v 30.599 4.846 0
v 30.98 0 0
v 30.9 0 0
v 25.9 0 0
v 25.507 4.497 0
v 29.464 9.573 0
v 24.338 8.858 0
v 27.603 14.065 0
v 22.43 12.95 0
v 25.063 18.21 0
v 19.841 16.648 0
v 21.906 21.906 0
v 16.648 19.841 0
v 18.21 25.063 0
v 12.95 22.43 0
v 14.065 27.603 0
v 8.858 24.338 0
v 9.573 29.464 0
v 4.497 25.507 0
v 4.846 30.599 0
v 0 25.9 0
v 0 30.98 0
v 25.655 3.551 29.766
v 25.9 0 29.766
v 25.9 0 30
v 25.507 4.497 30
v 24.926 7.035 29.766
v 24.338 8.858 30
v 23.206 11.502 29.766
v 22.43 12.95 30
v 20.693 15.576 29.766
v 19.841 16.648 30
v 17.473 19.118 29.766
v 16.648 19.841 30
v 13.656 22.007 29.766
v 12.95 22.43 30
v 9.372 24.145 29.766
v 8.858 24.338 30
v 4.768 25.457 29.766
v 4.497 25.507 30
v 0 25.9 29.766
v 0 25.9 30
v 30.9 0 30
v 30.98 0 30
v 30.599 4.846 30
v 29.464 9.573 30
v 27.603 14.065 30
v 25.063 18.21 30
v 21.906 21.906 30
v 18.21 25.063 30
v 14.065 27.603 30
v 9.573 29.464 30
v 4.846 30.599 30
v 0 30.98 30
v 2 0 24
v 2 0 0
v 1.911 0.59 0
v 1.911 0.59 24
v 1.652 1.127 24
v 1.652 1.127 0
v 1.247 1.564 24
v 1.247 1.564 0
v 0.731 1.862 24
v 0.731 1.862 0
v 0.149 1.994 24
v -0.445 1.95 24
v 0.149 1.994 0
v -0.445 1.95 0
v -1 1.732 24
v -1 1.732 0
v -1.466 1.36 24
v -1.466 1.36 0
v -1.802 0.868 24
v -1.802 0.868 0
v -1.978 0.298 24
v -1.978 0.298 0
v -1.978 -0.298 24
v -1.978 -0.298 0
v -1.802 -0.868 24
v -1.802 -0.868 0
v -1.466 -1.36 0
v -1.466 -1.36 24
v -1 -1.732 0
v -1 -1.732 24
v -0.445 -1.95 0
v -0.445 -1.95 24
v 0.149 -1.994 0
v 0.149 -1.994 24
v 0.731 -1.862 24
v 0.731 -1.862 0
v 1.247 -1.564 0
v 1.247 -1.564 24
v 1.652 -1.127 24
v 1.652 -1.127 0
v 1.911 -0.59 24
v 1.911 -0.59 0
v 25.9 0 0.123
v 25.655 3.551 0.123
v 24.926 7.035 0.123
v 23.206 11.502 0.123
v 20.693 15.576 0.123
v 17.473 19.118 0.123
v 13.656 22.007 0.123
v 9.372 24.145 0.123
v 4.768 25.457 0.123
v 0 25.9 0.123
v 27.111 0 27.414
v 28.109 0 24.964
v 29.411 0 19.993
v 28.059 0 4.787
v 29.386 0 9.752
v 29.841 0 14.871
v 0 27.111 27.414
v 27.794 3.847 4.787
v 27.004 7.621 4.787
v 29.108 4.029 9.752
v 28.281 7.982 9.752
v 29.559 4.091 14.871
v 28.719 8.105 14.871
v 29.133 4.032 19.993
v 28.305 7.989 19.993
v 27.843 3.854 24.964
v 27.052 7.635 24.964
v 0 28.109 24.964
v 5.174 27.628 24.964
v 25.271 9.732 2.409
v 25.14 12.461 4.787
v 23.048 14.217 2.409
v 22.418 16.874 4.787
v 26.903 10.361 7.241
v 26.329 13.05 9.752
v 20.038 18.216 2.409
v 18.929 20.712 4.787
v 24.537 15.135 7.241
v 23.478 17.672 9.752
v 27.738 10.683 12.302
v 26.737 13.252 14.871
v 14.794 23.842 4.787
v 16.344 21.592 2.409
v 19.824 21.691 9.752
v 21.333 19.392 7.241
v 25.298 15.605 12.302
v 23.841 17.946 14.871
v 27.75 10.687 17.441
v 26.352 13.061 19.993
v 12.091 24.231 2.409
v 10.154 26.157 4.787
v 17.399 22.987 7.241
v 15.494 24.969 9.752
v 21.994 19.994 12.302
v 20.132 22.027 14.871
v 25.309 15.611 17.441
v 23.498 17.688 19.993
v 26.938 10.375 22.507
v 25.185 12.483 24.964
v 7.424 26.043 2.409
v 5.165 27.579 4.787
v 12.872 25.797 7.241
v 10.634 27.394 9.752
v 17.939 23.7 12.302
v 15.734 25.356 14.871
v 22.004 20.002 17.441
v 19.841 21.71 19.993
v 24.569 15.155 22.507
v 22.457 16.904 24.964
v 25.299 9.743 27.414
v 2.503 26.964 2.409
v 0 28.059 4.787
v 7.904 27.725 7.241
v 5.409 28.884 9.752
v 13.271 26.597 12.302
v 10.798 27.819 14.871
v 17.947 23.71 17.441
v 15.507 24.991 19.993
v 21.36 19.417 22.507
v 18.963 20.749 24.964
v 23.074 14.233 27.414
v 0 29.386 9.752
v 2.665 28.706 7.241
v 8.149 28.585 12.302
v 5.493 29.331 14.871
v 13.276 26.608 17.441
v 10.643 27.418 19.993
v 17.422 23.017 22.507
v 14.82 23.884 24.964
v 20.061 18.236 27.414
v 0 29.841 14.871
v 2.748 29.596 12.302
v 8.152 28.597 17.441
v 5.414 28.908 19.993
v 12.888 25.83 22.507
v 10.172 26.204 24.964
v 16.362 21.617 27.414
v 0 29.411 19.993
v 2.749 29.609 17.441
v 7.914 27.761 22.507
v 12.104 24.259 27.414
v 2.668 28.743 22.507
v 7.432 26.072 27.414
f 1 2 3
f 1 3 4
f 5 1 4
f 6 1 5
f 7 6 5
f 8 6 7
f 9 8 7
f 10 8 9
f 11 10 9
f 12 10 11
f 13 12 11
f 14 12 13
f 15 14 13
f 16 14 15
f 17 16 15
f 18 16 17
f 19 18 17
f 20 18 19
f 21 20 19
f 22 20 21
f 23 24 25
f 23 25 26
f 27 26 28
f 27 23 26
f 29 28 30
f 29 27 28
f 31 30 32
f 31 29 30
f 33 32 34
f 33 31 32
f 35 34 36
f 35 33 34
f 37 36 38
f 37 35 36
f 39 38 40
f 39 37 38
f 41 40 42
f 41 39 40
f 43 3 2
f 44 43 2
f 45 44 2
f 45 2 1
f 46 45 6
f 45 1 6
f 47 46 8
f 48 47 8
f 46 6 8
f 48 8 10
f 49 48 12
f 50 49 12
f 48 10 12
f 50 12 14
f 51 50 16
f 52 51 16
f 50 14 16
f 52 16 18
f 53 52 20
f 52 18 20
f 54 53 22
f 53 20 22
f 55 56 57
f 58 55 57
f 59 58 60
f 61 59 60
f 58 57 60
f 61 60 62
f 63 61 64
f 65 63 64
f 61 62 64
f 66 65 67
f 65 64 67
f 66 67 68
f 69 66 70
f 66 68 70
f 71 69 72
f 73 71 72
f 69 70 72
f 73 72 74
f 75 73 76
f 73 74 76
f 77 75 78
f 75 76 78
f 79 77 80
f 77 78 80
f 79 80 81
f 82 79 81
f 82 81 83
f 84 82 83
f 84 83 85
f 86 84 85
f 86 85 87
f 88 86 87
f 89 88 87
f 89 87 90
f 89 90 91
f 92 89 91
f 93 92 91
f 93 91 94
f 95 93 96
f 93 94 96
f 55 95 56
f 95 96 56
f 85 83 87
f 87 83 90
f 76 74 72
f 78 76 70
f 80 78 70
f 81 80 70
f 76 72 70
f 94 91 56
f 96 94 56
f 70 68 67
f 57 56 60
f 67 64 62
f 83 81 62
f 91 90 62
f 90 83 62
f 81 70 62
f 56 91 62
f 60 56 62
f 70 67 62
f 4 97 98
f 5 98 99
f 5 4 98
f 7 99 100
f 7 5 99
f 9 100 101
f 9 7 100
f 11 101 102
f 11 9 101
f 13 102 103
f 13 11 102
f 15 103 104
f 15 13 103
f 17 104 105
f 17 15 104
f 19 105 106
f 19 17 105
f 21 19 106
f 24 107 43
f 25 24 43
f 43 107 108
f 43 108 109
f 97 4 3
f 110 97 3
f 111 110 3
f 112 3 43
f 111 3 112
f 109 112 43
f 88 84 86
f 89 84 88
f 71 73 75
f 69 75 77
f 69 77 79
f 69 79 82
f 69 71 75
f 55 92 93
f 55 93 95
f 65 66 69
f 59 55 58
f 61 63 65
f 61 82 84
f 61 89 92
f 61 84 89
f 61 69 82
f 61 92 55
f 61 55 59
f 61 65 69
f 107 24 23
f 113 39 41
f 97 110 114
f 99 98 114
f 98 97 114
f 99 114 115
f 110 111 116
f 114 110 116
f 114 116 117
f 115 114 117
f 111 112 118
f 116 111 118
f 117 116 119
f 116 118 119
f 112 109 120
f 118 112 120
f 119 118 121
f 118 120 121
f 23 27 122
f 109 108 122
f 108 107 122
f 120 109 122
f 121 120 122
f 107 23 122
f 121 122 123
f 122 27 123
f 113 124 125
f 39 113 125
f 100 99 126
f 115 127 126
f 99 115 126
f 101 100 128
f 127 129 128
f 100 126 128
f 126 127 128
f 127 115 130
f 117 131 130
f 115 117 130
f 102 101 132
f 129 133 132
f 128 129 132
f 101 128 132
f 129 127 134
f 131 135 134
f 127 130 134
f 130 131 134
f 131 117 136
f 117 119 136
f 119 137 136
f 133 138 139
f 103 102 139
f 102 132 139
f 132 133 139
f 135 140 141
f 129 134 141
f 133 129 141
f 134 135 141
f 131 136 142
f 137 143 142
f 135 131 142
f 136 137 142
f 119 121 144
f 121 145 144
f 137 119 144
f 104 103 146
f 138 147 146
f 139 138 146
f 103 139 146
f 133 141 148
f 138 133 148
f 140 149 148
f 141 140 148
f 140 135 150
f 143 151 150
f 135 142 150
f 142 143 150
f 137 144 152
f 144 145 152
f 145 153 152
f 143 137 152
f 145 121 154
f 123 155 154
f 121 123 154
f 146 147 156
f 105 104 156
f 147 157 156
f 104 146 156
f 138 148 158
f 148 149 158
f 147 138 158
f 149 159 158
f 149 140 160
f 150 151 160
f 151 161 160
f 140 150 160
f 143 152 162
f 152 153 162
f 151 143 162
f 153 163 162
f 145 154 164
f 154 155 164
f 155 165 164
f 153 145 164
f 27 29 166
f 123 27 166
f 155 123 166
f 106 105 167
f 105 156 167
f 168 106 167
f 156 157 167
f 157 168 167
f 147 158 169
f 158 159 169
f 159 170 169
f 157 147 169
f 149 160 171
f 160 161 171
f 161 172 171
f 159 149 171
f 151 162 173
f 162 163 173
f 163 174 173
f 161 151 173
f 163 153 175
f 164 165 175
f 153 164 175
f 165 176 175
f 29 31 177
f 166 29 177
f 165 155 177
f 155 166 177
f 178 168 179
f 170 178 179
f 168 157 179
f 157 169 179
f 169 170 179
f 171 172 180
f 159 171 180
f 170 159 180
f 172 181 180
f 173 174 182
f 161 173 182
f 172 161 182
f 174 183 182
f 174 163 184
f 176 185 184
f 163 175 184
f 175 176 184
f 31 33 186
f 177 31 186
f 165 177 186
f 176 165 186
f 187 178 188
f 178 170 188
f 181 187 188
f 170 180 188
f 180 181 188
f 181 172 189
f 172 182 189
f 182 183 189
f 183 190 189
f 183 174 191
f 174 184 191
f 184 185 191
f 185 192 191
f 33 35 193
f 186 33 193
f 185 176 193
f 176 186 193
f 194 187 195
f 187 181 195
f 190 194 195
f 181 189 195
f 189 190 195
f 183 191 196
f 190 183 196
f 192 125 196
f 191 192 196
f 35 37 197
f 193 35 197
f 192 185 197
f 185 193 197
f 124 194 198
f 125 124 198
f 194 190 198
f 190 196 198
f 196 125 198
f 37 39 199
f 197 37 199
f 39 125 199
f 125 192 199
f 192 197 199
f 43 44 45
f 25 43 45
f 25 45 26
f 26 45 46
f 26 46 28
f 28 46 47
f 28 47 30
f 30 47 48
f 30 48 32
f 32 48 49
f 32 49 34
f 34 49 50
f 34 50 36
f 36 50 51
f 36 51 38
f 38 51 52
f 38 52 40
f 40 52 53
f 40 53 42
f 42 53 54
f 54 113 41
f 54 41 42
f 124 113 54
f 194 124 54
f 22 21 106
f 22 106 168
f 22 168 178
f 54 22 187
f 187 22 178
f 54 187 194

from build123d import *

# Parameters (mm, degrees)
CYLINDER011_R               = 2
CYLINDER011_DEPTH           = 24
CYLINDER011_ROLL_ANGLE      = -25.142505
CYLINDER011_PITCH_ANGLE     = 89.880709
CYLINDER011_PLACEMENT_ANGLE = 25.142505
BASEFEATURE_ROLL_ANGLE      = 89.859615
BASEFEATURE_PITCH_ANGLE     = -39.714859
BASEFEATURE_PLACEMENT_ANGLE = -89.859615
PAD_DEPTH                   = 30


with BuildPart() as part:
    # Cylinder011 → Cylinder011 (new body)
    with BuildSketch(Plane.XY):
        Circle(CYLINDER011_R)
    extrude(amount=CYLINDER011_DEPTH)


with BuildPart() as part_1:
    # Cylinder011 roll: moved
    add(part.part.rotate(Axis((0, 0, 0), (1, 0, 0)), CYLINDER011_ROLL_ANGLE))


with BuildPart() as part_2:
    # Cylinder011 pitch: moved
    add(part_1.part.rotate(Axis((0, 0, 0), (0, 1, 0)), CYLINDER011_PITCH_ANGLE))


with BuildPart() as part_3:
    # Cylinder011 placement: moved
    add(part_2.part.moved(Location((21.03, 20.35, 4))).rotate(Axis((21.03, 20.35, 4), (0, 0, 1)), CYLINDER011_PLACEMENT_ANGLE))


with BuildPart() as part_4:
    # BaseFeature roll: moved
    add(part_3.part.rotate(Axis((0, 0, 0), (1, 0, 0)), BASEFEATURE_ROLL_ANGLE))


with BuildPart() as part_5:
    # BaseFeature pitch: moved
    add(part_4.part.rotate(Axis((0, 0, 0), (0, 1, 0)), BASEFEATURE_PITCH_ANGLE))


with BuildPart() as part_6:
    # BaseFeature placement: moved
    add(part_5.part.moved(Location((3.942353, 3.177449, -29.098884))).rotate(Axis((3.942353, 3.177449, -29.098884), (0, 0, 1)), BASEFEATURE_PLACEMENT_ANGLE))

    # Sketch (on XY_Plane of Origin) → Pad (new body)
    with BuildSketch(Plane.XY):
        with BuildLine():
            ThreePointArc((25.9, 8e-06), (18.314063, 18.314069), (0, 25.9))
            Line((0, 25.9), (0, 30.9))
            Line((0, 30.9), (0, 30.98))
            ThreePointArc((30.98, 0), (21.906168, 21.906168), (0, 30.98))
            Line((30.9, 0), (30.98, 0))
            Line((25.9, 8e-06), (30.9, 0))
        make_face()
    extrude(amount=PAD_DEPTH)

    # Sketch001 (on XZ_Plane of Origin) → Groove (revolve, cut)
    with BuildSketch(Plane.XZ):
        with BuildLine():
            ThreePointArc((25.828939, 0), (29.840979, 14.944895), (25.828939, 29.88979))
            Line((25.828939, 29.88979), (25.828939, 0))
        make_face()
    revolve(axis=Axis((0, 0, 0), (0, 0, 1)), mode=Mode.SUBTRACT)


solid = part_6.part
